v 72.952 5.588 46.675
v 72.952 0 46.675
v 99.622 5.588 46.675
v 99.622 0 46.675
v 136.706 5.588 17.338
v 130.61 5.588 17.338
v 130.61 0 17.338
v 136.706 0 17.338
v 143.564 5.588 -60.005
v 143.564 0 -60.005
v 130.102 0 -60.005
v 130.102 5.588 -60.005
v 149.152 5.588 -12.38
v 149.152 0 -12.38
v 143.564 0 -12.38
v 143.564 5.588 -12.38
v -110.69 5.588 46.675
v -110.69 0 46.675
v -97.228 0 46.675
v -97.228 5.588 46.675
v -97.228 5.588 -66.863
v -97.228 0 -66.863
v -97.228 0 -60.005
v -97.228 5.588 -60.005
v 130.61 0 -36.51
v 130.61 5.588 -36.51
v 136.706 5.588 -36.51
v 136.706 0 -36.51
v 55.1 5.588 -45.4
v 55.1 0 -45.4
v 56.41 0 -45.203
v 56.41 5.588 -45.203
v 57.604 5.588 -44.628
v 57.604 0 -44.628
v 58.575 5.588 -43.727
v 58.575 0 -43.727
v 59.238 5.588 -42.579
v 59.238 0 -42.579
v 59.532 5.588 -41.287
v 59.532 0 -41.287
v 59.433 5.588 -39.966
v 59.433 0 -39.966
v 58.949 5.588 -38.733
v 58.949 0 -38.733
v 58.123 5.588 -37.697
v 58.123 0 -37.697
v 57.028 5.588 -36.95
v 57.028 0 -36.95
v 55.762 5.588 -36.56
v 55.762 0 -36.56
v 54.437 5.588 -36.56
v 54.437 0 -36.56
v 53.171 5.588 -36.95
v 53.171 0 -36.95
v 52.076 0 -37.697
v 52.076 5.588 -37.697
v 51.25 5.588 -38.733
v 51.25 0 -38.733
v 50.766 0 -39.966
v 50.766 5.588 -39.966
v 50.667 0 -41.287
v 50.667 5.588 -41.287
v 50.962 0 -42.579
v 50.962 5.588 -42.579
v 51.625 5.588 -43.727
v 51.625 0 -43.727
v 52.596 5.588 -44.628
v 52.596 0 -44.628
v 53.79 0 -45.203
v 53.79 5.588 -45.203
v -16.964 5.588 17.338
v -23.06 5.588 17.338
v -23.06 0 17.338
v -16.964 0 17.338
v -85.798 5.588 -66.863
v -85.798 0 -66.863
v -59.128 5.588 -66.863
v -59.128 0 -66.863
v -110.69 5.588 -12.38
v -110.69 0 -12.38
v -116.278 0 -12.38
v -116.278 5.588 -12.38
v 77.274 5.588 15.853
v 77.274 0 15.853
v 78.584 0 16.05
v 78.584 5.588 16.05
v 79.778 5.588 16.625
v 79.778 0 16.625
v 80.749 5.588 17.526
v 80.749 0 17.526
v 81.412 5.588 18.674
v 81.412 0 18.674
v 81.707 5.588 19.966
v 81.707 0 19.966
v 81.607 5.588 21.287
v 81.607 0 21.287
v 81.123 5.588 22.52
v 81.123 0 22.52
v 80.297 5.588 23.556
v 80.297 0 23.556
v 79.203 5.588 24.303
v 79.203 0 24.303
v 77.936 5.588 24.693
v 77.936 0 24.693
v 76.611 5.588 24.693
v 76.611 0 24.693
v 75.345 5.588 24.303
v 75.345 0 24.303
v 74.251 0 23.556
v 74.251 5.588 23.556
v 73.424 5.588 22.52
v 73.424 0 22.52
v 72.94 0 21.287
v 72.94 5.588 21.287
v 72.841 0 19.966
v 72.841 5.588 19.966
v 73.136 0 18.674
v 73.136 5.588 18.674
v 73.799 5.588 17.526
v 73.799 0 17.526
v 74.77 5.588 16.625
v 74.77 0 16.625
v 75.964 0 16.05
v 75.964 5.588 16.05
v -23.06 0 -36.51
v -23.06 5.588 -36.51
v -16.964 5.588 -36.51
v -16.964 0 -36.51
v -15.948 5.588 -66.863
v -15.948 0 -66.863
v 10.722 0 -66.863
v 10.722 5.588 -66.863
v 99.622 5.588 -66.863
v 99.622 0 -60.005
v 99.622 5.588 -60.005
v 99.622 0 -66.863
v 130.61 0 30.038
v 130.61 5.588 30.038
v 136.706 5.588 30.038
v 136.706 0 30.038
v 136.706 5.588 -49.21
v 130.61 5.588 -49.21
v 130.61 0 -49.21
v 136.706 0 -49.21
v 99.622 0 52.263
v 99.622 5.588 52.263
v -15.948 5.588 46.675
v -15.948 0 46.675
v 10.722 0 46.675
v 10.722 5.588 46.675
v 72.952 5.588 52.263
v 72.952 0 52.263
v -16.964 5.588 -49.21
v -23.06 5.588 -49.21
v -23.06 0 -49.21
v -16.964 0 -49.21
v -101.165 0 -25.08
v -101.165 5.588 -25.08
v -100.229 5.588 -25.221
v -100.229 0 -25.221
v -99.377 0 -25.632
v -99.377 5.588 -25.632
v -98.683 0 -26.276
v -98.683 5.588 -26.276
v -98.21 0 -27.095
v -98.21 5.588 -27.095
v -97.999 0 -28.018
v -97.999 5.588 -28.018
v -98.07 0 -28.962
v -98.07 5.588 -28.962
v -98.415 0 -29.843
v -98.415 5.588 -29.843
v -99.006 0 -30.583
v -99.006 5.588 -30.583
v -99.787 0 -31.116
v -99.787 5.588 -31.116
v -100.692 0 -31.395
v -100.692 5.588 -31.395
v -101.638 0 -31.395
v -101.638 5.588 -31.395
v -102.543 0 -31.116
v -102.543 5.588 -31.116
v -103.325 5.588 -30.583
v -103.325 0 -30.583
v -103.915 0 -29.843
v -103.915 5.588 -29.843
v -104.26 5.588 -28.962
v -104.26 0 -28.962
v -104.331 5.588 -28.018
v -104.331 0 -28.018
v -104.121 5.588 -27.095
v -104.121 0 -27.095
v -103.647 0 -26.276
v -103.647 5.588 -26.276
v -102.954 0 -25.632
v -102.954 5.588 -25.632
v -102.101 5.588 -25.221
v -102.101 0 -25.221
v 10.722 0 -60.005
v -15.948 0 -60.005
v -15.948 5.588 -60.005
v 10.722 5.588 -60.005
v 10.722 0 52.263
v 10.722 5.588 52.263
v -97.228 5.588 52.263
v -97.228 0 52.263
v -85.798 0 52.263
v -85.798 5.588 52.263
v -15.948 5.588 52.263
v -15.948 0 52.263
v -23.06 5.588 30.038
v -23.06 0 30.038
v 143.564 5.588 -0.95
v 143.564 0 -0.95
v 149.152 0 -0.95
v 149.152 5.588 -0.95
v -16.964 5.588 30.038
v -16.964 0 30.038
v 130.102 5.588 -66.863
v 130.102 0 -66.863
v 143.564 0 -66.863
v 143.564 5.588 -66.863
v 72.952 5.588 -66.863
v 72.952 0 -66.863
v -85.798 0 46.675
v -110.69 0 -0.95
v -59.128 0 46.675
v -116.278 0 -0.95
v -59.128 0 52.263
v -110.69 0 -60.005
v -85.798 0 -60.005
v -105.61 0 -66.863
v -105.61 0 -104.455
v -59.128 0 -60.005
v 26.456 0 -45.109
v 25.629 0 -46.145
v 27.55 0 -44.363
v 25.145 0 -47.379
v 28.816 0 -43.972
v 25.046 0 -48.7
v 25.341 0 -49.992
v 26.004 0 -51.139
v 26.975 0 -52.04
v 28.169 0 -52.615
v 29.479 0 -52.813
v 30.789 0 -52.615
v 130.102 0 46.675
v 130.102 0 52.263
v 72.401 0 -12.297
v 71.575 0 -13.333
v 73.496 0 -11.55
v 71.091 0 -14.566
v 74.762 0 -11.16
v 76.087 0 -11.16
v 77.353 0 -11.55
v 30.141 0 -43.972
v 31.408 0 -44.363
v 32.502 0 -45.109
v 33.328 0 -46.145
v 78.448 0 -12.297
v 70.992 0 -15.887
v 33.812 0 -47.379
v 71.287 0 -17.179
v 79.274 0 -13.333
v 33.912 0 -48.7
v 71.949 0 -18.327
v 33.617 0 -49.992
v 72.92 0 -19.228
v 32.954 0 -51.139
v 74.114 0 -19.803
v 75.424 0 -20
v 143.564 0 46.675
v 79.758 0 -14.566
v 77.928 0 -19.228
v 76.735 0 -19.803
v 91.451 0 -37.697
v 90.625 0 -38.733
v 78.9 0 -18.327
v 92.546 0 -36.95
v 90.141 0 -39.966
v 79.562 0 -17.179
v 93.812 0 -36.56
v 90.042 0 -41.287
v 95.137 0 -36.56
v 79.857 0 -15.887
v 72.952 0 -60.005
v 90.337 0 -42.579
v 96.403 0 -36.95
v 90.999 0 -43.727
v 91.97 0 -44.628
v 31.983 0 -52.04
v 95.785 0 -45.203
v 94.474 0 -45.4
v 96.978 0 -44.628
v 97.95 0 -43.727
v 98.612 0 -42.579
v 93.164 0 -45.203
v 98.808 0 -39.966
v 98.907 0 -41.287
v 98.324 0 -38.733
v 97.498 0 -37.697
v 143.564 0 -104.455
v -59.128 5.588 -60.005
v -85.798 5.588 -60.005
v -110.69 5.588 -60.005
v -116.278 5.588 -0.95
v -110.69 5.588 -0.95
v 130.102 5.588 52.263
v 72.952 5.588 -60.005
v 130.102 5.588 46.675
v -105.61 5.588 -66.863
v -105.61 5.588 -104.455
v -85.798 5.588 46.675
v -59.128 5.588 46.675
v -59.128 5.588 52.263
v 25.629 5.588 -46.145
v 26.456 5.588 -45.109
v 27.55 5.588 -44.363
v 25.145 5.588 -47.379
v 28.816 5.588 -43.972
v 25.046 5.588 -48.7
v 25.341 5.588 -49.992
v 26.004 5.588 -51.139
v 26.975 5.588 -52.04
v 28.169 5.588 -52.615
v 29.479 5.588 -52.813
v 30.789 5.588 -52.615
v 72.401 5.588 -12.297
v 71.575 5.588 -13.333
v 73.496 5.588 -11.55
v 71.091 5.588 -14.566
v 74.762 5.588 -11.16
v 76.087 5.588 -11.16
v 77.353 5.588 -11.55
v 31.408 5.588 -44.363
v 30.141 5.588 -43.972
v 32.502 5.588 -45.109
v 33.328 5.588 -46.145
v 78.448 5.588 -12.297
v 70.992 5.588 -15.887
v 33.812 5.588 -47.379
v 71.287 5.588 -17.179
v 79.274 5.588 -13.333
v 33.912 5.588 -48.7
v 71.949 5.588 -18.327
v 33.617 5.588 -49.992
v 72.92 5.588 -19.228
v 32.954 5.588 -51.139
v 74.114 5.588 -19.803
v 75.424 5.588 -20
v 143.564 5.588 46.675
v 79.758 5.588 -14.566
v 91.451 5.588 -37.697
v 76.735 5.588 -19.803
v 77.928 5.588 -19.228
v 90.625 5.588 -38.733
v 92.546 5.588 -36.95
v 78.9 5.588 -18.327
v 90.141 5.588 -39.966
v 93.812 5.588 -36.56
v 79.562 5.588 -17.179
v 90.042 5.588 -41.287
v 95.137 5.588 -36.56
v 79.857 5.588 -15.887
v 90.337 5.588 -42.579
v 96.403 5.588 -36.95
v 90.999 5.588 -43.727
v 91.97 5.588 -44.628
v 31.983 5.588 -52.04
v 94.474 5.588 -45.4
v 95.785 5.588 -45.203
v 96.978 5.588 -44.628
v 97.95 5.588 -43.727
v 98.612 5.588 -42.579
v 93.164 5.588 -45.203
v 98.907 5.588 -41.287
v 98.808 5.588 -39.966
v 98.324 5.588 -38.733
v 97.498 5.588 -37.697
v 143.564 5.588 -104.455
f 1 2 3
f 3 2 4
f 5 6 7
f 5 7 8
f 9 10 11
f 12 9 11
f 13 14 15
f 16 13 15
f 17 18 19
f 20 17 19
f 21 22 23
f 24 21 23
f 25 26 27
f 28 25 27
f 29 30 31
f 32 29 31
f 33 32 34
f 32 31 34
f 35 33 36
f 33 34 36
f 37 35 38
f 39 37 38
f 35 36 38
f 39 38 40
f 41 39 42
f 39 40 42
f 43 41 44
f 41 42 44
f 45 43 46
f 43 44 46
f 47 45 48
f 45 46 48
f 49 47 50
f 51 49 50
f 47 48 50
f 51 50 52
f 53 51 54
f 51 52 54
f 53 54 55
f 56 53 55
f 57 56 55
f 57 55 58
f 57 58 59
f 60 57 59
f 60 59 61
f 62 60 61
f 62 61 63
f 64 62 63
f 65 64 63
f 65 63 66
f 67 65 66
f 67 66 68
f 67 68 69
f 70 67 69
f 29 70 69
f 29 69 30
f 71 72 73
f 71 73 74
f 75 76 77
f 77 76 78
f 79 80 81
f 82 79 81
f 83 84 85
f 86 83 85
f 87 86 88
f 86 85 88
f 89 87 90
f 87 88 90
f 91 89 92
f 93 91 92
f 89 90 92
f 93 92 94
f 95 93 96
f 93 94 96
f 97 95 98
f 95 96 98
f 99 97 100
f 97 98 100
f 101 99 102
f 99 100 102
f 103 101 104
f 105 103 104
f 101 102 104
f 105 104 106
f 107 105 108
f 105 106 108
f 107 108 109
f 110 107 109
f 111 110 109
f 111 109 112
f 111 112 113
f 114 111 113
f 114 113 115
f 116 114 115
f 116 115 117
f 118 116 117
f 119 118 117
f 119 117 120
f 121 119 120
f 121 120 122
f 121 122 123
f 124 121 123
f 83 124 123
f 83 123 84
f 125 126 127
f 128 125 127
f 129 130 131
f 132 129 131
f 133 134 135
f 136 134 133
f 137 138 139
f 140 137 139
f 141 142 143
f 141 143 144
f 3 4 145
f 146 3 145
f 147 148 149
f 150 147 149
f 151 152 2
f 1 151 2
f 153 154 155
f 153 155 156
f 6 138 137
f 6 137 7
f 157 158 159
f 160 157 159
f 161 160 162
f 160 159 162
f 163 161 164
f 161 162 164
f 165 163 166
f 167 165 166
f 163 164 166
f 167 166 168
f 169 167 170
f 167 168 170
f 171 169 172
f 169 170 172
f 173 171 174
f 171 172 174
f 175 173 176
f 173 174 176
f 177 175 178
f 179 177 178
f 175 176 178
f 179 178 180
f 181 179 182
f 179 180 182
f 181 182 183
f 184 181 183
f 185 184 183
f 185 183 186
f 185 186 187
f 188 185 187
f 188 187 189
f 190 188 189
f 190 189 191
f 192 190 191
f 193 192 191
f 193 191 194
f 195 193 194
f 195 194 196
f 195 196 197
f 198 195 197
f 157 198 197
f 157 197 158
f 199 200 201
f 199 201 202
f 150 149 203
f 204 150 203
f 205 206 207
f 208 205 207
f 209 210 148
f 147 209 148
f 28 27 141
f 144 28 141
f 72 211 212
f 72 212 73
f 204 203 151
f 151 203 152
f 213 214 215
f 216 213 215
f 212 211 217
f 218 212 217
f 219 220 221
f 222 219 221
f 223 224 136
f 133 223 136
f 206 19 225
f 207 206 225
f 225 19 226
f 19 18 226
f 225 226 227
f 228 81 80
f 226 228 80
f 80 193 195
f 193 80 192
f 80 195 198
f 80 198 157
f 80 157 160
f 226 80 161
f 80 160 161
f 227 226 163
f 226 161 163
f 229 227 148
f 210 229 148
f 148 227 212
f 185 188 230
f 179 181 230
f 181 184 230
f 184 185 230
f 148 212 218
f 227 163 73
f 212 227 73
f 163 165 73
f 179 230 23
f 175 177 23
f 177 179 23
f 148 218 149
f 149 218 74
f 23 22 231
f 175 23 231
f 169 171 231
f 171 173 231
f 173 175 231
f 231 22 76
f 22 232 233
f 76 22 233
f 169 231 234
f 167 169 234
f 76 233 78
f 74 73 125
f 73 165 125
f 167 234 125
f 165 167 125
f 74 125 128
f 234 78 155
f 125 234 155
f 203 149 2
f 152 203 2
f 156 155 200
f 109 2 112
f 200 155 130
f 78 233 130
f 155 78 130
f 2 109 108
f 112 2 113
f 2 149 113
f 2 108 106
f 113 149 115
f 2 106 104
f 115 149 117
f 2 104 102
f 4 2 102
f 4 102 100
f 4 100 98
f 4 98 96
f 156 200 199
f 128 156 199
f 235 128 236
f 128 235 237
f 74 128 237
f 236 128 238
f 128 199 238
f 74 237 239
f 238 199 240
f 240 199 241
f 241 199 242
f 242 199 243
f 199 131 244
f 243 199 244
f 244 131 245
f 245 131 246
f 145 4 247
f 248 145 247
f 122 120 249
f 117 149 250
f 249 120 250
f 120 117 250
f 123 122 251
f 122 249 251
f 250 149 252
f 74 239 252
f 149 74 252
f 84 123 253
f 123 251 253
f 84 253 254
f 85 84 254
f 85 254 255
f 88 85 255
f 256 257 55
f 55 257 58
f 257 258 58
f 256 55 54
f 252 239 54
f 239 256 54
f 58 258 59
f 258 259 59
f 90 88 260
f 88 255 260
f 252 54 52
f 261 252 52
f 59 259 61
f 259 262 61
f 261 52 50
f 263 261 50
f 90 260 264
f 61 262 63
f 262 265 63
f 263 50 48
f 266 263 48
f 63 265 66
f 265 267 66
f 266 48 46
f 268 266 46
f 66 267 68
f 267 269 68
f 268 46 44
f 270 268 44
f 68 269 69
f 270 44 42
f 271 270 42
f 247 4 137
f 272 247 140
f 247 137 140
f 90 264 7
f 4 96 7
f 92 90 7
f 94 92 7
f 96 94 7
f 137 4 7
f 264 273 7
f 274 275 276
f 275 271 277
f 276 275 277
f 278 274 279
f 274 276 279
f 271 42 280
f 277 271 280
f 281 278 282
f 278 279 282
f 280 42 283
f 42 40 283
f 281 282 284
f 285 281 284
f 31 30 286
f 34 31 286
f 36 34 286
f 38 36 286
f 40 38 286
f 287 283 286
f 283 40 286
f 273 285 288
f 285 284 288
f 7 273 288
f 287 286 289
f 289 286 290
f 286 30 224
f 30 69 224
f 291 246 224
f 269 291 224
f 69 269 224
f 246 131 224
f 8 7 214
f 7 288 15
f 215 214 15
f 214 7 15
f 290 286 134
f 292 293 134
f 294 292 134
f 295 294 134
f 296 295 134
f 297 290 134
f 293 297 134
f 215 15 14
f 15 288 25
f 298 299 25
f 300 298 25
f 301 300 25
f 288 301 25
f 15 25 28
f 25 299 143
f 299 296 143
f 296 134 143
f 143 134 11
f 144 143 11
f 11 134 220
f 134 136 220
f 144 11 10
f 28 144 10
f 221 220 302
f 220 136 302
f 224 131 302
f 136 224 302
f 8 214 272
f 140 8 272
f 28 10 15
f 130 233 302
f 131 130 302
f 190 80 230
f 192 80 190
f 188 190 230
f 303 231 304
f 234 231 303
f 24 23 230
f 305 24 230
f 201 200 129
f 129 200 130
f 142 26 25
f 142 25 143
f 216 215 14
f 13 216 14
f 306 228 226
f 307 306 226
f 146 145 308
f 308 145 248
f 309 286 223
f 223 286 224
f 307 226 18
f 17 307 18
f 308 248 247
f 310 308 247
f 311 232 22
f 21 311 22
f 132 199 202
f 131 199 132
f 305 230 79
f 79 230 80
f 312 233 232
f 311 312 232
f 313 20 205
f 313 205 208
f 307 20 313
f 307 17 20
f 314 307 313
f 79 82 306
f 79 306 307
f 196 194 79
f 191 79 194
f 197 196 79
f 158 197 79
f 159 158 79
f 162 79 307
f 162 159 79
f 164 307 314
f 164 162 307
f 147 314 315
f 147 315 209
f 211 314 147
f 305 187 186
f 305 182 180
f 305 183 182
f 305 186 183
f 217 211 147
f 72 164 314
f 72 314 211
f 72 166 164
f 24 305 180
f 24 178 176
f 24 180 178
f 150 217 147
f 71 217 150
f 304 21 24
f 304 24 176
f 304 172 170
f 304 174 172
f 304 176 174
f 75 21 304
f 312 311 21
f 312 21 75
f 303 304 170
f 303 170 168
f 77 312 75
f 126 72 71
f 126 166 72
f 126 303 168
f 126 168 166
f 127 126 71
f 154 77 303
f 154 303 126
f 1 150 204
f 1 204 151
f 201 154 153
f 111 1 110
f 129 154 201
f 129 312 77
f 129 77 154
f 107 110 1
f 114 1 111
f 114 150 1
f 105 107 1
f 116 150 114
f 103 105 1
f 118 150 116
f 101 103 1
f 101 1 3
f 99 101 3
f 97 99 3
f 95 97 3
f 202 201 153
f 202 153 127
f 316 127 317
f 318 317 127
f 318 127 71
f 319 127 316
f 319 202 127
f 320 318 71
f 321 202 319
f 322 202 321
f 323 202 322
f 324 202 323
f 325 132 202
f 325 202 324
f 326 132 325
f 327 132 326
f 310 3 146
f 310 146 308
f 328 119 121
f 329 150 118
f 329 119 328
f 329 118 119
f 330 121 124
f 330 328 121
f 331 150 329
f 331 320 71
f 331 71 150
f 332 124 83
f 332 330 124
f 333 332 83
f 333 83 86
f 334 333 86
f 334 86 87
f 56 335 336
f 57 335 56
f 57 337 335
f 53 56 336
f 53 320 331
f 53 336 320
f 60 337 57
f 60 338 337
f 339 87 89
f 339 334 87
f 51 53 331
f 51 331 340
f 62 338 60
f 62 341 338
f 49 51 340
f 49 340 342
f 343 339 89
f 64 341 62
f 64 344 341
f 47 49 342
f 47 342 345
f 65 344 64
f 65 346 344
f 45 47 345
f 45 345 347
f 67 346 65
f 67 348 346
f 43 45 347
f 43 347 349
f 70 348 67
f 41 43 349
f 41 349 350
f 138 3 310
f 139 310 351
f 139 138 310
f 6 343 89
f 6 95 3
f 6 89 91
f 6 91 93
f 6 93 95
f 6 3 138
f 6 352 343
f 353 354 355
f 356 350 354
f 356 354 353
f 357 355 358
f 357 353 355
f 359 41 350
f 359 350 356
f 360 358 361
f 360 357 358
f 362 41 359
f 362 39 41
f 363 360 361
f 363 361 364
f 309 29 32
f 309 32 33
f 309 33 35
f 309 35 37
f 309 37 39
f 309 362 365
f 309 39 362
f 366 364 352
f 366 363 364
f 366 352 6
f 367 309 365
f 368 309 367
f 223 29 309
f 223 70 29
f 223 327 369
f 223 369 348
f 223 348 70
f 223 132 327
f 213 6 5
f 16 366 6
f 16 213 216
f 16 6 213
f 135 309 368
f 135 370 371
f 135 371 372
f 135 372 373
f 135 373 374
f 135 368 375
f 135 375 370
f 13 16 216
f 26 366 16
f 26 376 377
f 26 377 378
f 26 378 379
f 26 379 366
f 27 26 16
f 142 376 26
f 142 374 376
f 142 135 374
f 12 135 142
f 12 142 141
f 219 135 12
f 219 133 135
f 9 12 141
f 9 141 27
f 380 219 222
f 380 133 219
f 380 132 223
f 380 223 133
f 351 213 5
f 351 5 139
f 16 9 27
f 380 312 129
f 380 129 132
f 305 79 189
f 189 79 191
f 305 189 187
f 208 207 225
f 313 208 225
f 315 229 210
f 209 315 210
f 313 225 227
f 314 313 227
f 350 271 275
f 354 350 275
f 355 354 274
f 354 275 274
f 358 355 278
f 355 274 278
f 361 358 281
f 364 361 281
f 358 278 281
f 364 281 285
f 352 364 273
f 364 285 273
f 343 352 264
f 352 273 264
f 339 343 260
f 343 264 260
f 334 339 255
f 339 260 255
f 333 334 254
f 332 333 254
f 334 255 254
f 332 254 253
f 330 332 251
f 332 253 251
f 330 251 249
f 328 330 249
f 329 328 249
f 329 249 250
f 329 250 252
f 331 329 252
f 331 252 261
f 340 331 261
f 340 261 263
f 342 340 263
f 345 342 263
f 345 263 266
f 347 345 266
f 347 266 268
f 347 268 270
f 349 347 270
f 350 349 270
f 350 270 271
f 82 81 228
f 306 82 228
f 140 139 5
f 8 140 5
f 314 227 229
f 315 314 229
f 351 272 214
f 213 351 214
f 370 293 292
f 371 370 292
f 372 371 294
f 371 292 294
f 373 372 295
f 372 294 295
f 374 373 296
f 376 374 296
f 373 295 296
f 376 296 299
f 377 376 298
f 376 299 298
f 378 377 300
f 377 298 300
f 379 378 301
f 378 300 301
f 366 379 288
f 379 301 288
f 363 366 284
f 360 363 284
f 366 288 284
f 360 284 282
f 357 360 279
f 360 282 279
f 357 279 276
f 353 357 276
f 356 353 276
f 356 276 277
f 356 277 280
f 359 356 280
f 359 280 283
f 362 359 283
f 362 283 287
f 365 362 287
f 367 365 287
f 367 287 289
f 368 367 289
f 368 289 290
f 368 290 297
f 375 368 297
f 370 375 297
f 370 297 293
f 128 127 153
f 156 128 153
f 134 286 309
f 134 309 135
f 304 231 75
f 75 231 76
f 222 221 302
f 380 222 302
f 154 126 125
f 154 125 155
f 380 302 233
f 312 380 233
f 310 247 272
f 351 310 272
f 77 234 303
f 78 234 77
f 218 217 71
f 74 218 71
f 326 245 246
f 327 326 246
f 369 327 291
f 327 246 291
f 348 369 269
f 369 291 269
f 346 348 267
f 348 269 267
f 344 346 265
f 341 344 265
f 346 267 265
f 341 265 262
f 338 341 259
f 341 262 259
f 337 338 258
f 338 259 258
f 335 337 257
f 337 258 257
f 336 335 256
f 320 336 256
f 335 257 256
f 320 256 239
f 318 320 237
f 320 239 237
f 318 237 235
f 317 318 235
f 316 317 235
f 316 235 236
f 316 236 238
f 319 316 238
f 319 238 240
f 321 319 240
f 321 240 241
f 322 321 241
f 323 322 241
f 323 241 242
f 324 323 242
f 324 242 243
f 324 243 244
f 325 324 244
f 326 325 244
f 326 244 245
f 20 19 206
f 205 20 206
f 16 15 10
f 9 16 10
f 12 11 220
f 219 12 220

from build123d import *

# Parameters (mm, degrees)
SKETCH1_W           = 26.67
SKETCH1_H           = 6.858
BOSS_EXTRUDE1_DEPTH = 5.588
CUT_EXTRUDE1_REACH  = 184.177
SKETCH9_W           = 6.096
SKETCH9_H           = 12.7
CUT_EXTRUDE2_REACH  = 184.177
SKETCH12_R          = 3.175
CUT_EXTRUDE3_REACH  = 184.177
SKETCH13_R          = 4.445


with BuildPart() as part:
    # Sketch1 → Boss-Extrude1 (new body)
    with BuildSketch(Plane(origin=(0, 0, 0), x_dir=(1, 0, 0), z_dir=(0, 1, 0))):
        Polygon((-110.690062624, 12.380140685), (-116.278062624, 12.380140685), (-116.278062624, 0.950140685), (-110.690062624, 0.950140685), (-110.690062624, -46.674859251), (-97.228062624, -46.674859251), (-97.228062624, -52.262859251), (-85.798062624, -52.262859251), (-85.798062624, -46.674859251), (-59.128062624, -46.674859251), (-59.128062624, -52.262859251), (-15.948062624, -52.262859251), (-15.948062624, -46.674859251), (10.721937376, -46.674859251), (10.721937376, -52.262859251), (72.951937376, -52.262859251), (72.951937376, -46.674859251), (99.621937376, -46.674859251), (99.621937376, -52.262859251), (130.101937376, -52.262859251), (130.101937376, -46.67485938), (143.563937376, -46.67485938), (143.563937376, 0.950140682), (149.151937376, 0.950140682), (149.151937376, 12.38014062), (143.563937376, 12.38014062), (143.563937376, 60.00514062), (130.101937376, 60.00514062), (130.101937376, 66.86314062), (143.563937376, 66.86314062), (143.563937376, 104.45514062), (-105.610062624, 104.45514062), (-105.610062624, 66.86314062), (-97.228062624, 66.86314062), (-97.228062624, 60.00514062), (-110.690062624, 60.00514062), align=None)
        with Locations((-72.463062624, 63.43414062)):
            Rectangle(SKETCH1_W, SKETCH1_H, mode=Mode.SUBTRACT)
        with Locations((-2.613062624, 63.43414062)):
            Rectangle(SKETCH1_W, SKETCH1_H, mode=Mode.SUBTRACT)
        with Locations((86.286937376, 63.43414062)):
            Rectangle(SKETCH1_W, SKETCH1_H, mode=Mode.SUBTRACT)
    extrude(amount=BOSS_EXTRUDE1_DEPTH)

    # Sketch9 → Cut-Extrude1 (cut, up to next)
    with BuildSketch(Plane(origin=(0, 5.588, 0), x_dir=(1, 0, 0), z_dir=(0, 1, 0)), mode=Mode.PRIVATE) as cut_extrude1_sk1:
        with Locations((-20.012062624, -23.687859251)):
            Rectangle(SKETCH9_W, SKETCH9_H)
    cut_extrude1_tool1 = extrude(cut_extrude1_sk1.sketch, amount=-CUT_EXTRUDE1_REACH, mode=Mode.PRIVATE) & part.part
    # Sketch9 → Cut-Extrude1 (cut, up to next)
    with BuildSketch(Plane(origin=(0, 5.588, 0), x_dir=(1, 0, 0), z_dir=(0, 1, 0)), mode=Mode.PRIVATE) as cut_extrude1_sk2:
        with Locations((-20.012062624, 42.860140749)):
            Rectangle(SKETCH9_W, SKETCH9_H)
    cut_extrude1_tool2 = extrude(cut_extrude1_sk2.sketch, amount=-CUT_EXTRUDE1_REACH, mode=Mode.PRIVATE) & part.part
    # Sketch9 → Cut-Extrude1 (cut, up to next)
    with BuildSketch(Plane(origin=(0, 5.588, 0), x_dir=(1, 0, 0), z_dir=(0, 1, 0)), mode=Mode.PRIVATE) as cut_extrude1_sk3:
        with Locations((133.657937376, -23.687859251)):
            Rectangle(SKETCH9_W, SKETCH9_H)
    cut_extrude1_tool3 = extrude(cut_extrude1_sk3.sketch, amount=-CUT_EXTRUDE1_REACH, mode=Mode.PRIVATE) & part.part
    # Sketch9 → Cut-Extrude1 (cut, up to next)
    with BuildSketch(Plane(origin=(0, 5.588, 0), x_dir=(1, 0, 0), z_dir=(0, 1, 0)), mode=Mode.PRIVATE) as cut_extrude1_sk4:
        with Locations((133.657937376, 42.860140749)):
            Rectangle(SKETCH9_W, SKETCH9_H)
    cut_extrude1_tool4 = extrude(cut_extrude1_sk4.sketch, amount=-CUT_EXTRUDE1_REACH, mode=Mode.PRIVATE) & part.part
    add(cut_extrude1_tool1.solids().sort_by_distance((-20.012063, 5.588, 23.687859))[0], mode=Mode.SUBTRACT)
    add(cut_extrude1_tool2.solids().sort_by_distance((-20.012063, 5.588, -42.860141))[0], mode=Mode.SUBTRACT)
    add(cut_extrude1_tool3.solids().sort_by_distance((133.657937, 5.588, 23.687859))[0], mode=Mode.SUBTRACT)
    add(cut_extrude1_tool4.solids().sort_by_distance((133.657937, 5.588, -42.860141))[0], mode=Mode.SUBTRACT)

    # Sketch12 → Cut-Extrude2 (cut, up to next)
    with BuildSketch(Plane(origin=(0, 5.588, 0), x_dir=(1, 0, 0), z_dir=(0, 1, 0)), mode=Mode.PRIVATE) as cut_extrude2_sk1:
        with Locations(Location((-101.165062624, 28.25514062, 0), (0, 0, 270))):
            Circle(SKETCH12_R)
    cut_extrude2_tool1 = extrude(cut_extrude2_sk1.sketch, amount=-CUT_EXTRUDE2_REACH, mode=Mode.PRIVATE) & part.part
    add(cut_extrude2_tool1.solids().sort_by_distance((-101.165063, 5.588, -28.255141))[0], mode=Mode.SUBTRACT)

    # Sketch13 → Cut-Extrude3 (cut, up to next)
    with BuildSketch(Plane.XZ, mode=Mode.PRIVATE) as cut_extrude3_sk1:
        with Locations(Location((77.273937376, 20.297859251, 0), (0, 0, 270))):
            Circle(SKETCH13_R)
    cut_extrude3_tool1 = extrude(cut_extrude3_sk1.sketch, amount=-CUT_EXTRUDE3_REACH, mode=Mode.PRIVATE) & part.part
    # Sketch13 → Cut-Extrude3 (cut, up to next)
    with BuildSketch(Plane.XZ, mode=Mode.PRIVATE) as cut_extrude3_sk2:
        with Locations(Location((55.099783131, -40.95514062, 0), (0, 0, 270))):
            Circle(SKETCH13_R)
    cut_extrude3_tool2 = extrude(cut_extrude3_sk2.sketch, amount=-CUT_EXTRUDE3_REACH, mode=Mode.PRIVATE) & part.part
    # Sketch13 → Cut-Extrude3 (cut, up to next)
    with BuildSketch(Plane.XZ, mode=Mode.PRIVATE) as cut_extrude3_sk3:
        with Locations(Location((94.474354319, -40.95514062, 0), (0, 0, 270))):
            Circle(SKETCH13_R)
    cut_extrude3_tool3 = extrude(cut_extrude3_sk3.sketch, amount=-CUT_EXTRUDE3_REACH, mode=Mode.PRIVATE) & part.part
    # Sketch13 → Cut-Extrude3 (cut, up to next)
    with BuildSketch(Plane.XZ, mode=Mode.PRIVATE) as cut_extrude3_sk4:
        with Locations(Location((75.424354319, -15.55514062, 0), (0, 0, 270))):
            Circle(SKETCH13_R)
    cut_extrude3_tool4 = extrude(cut_extrude3_sk4.sketch, amount=-CUT_EXTRUDE3_REACH, mode=Mode.PRIVATE) & part.part
    # Sketch13 → Cut-Extrude3 (cut, up to next)
    with BuildSketch(Plane.XZ, mode=Mode.PRIVATE) as cut_extrude3_sk5:
        with Locations(Location((29.478937376, -48.367787821, 0), (0, 0, 270))):
            Circle(SKETCH13_R)
    cut_extrude3_tool5 = extrude(cut_extrude3_sk5.sketch, amount=-CUT_EXTRUDE3_REACH, mode=Mode.PRIVATE) & part.part
    add(cut_extrude3_tool1.solids().sort_by_distance((77.273937, 0, 20.297859))[0], mode=Mode.SUBTRACT)
    add(cut_extrude3_tool2.solids().sort_by_distance((55.099783, 0, -40.955141))[0], mode=Mode.SUBTRACT)
    add(cut_extrude3_tool3.solids().sort_by_distance((94.474354, 0, -40.955141))[0], mode=Mode.SUBTRACT)
    add(cut_extrude3_tool4.solids().sort_by_distance((75.424354, 0, -15.555141))[0], mode=Mode.SUBTRACT)
    add(cut_extrude3_tool5.solids().sort_by_distance((29.478937, 0, -48.367788))[0], mode=Mode.SUBTRACT)


solid = part.part
